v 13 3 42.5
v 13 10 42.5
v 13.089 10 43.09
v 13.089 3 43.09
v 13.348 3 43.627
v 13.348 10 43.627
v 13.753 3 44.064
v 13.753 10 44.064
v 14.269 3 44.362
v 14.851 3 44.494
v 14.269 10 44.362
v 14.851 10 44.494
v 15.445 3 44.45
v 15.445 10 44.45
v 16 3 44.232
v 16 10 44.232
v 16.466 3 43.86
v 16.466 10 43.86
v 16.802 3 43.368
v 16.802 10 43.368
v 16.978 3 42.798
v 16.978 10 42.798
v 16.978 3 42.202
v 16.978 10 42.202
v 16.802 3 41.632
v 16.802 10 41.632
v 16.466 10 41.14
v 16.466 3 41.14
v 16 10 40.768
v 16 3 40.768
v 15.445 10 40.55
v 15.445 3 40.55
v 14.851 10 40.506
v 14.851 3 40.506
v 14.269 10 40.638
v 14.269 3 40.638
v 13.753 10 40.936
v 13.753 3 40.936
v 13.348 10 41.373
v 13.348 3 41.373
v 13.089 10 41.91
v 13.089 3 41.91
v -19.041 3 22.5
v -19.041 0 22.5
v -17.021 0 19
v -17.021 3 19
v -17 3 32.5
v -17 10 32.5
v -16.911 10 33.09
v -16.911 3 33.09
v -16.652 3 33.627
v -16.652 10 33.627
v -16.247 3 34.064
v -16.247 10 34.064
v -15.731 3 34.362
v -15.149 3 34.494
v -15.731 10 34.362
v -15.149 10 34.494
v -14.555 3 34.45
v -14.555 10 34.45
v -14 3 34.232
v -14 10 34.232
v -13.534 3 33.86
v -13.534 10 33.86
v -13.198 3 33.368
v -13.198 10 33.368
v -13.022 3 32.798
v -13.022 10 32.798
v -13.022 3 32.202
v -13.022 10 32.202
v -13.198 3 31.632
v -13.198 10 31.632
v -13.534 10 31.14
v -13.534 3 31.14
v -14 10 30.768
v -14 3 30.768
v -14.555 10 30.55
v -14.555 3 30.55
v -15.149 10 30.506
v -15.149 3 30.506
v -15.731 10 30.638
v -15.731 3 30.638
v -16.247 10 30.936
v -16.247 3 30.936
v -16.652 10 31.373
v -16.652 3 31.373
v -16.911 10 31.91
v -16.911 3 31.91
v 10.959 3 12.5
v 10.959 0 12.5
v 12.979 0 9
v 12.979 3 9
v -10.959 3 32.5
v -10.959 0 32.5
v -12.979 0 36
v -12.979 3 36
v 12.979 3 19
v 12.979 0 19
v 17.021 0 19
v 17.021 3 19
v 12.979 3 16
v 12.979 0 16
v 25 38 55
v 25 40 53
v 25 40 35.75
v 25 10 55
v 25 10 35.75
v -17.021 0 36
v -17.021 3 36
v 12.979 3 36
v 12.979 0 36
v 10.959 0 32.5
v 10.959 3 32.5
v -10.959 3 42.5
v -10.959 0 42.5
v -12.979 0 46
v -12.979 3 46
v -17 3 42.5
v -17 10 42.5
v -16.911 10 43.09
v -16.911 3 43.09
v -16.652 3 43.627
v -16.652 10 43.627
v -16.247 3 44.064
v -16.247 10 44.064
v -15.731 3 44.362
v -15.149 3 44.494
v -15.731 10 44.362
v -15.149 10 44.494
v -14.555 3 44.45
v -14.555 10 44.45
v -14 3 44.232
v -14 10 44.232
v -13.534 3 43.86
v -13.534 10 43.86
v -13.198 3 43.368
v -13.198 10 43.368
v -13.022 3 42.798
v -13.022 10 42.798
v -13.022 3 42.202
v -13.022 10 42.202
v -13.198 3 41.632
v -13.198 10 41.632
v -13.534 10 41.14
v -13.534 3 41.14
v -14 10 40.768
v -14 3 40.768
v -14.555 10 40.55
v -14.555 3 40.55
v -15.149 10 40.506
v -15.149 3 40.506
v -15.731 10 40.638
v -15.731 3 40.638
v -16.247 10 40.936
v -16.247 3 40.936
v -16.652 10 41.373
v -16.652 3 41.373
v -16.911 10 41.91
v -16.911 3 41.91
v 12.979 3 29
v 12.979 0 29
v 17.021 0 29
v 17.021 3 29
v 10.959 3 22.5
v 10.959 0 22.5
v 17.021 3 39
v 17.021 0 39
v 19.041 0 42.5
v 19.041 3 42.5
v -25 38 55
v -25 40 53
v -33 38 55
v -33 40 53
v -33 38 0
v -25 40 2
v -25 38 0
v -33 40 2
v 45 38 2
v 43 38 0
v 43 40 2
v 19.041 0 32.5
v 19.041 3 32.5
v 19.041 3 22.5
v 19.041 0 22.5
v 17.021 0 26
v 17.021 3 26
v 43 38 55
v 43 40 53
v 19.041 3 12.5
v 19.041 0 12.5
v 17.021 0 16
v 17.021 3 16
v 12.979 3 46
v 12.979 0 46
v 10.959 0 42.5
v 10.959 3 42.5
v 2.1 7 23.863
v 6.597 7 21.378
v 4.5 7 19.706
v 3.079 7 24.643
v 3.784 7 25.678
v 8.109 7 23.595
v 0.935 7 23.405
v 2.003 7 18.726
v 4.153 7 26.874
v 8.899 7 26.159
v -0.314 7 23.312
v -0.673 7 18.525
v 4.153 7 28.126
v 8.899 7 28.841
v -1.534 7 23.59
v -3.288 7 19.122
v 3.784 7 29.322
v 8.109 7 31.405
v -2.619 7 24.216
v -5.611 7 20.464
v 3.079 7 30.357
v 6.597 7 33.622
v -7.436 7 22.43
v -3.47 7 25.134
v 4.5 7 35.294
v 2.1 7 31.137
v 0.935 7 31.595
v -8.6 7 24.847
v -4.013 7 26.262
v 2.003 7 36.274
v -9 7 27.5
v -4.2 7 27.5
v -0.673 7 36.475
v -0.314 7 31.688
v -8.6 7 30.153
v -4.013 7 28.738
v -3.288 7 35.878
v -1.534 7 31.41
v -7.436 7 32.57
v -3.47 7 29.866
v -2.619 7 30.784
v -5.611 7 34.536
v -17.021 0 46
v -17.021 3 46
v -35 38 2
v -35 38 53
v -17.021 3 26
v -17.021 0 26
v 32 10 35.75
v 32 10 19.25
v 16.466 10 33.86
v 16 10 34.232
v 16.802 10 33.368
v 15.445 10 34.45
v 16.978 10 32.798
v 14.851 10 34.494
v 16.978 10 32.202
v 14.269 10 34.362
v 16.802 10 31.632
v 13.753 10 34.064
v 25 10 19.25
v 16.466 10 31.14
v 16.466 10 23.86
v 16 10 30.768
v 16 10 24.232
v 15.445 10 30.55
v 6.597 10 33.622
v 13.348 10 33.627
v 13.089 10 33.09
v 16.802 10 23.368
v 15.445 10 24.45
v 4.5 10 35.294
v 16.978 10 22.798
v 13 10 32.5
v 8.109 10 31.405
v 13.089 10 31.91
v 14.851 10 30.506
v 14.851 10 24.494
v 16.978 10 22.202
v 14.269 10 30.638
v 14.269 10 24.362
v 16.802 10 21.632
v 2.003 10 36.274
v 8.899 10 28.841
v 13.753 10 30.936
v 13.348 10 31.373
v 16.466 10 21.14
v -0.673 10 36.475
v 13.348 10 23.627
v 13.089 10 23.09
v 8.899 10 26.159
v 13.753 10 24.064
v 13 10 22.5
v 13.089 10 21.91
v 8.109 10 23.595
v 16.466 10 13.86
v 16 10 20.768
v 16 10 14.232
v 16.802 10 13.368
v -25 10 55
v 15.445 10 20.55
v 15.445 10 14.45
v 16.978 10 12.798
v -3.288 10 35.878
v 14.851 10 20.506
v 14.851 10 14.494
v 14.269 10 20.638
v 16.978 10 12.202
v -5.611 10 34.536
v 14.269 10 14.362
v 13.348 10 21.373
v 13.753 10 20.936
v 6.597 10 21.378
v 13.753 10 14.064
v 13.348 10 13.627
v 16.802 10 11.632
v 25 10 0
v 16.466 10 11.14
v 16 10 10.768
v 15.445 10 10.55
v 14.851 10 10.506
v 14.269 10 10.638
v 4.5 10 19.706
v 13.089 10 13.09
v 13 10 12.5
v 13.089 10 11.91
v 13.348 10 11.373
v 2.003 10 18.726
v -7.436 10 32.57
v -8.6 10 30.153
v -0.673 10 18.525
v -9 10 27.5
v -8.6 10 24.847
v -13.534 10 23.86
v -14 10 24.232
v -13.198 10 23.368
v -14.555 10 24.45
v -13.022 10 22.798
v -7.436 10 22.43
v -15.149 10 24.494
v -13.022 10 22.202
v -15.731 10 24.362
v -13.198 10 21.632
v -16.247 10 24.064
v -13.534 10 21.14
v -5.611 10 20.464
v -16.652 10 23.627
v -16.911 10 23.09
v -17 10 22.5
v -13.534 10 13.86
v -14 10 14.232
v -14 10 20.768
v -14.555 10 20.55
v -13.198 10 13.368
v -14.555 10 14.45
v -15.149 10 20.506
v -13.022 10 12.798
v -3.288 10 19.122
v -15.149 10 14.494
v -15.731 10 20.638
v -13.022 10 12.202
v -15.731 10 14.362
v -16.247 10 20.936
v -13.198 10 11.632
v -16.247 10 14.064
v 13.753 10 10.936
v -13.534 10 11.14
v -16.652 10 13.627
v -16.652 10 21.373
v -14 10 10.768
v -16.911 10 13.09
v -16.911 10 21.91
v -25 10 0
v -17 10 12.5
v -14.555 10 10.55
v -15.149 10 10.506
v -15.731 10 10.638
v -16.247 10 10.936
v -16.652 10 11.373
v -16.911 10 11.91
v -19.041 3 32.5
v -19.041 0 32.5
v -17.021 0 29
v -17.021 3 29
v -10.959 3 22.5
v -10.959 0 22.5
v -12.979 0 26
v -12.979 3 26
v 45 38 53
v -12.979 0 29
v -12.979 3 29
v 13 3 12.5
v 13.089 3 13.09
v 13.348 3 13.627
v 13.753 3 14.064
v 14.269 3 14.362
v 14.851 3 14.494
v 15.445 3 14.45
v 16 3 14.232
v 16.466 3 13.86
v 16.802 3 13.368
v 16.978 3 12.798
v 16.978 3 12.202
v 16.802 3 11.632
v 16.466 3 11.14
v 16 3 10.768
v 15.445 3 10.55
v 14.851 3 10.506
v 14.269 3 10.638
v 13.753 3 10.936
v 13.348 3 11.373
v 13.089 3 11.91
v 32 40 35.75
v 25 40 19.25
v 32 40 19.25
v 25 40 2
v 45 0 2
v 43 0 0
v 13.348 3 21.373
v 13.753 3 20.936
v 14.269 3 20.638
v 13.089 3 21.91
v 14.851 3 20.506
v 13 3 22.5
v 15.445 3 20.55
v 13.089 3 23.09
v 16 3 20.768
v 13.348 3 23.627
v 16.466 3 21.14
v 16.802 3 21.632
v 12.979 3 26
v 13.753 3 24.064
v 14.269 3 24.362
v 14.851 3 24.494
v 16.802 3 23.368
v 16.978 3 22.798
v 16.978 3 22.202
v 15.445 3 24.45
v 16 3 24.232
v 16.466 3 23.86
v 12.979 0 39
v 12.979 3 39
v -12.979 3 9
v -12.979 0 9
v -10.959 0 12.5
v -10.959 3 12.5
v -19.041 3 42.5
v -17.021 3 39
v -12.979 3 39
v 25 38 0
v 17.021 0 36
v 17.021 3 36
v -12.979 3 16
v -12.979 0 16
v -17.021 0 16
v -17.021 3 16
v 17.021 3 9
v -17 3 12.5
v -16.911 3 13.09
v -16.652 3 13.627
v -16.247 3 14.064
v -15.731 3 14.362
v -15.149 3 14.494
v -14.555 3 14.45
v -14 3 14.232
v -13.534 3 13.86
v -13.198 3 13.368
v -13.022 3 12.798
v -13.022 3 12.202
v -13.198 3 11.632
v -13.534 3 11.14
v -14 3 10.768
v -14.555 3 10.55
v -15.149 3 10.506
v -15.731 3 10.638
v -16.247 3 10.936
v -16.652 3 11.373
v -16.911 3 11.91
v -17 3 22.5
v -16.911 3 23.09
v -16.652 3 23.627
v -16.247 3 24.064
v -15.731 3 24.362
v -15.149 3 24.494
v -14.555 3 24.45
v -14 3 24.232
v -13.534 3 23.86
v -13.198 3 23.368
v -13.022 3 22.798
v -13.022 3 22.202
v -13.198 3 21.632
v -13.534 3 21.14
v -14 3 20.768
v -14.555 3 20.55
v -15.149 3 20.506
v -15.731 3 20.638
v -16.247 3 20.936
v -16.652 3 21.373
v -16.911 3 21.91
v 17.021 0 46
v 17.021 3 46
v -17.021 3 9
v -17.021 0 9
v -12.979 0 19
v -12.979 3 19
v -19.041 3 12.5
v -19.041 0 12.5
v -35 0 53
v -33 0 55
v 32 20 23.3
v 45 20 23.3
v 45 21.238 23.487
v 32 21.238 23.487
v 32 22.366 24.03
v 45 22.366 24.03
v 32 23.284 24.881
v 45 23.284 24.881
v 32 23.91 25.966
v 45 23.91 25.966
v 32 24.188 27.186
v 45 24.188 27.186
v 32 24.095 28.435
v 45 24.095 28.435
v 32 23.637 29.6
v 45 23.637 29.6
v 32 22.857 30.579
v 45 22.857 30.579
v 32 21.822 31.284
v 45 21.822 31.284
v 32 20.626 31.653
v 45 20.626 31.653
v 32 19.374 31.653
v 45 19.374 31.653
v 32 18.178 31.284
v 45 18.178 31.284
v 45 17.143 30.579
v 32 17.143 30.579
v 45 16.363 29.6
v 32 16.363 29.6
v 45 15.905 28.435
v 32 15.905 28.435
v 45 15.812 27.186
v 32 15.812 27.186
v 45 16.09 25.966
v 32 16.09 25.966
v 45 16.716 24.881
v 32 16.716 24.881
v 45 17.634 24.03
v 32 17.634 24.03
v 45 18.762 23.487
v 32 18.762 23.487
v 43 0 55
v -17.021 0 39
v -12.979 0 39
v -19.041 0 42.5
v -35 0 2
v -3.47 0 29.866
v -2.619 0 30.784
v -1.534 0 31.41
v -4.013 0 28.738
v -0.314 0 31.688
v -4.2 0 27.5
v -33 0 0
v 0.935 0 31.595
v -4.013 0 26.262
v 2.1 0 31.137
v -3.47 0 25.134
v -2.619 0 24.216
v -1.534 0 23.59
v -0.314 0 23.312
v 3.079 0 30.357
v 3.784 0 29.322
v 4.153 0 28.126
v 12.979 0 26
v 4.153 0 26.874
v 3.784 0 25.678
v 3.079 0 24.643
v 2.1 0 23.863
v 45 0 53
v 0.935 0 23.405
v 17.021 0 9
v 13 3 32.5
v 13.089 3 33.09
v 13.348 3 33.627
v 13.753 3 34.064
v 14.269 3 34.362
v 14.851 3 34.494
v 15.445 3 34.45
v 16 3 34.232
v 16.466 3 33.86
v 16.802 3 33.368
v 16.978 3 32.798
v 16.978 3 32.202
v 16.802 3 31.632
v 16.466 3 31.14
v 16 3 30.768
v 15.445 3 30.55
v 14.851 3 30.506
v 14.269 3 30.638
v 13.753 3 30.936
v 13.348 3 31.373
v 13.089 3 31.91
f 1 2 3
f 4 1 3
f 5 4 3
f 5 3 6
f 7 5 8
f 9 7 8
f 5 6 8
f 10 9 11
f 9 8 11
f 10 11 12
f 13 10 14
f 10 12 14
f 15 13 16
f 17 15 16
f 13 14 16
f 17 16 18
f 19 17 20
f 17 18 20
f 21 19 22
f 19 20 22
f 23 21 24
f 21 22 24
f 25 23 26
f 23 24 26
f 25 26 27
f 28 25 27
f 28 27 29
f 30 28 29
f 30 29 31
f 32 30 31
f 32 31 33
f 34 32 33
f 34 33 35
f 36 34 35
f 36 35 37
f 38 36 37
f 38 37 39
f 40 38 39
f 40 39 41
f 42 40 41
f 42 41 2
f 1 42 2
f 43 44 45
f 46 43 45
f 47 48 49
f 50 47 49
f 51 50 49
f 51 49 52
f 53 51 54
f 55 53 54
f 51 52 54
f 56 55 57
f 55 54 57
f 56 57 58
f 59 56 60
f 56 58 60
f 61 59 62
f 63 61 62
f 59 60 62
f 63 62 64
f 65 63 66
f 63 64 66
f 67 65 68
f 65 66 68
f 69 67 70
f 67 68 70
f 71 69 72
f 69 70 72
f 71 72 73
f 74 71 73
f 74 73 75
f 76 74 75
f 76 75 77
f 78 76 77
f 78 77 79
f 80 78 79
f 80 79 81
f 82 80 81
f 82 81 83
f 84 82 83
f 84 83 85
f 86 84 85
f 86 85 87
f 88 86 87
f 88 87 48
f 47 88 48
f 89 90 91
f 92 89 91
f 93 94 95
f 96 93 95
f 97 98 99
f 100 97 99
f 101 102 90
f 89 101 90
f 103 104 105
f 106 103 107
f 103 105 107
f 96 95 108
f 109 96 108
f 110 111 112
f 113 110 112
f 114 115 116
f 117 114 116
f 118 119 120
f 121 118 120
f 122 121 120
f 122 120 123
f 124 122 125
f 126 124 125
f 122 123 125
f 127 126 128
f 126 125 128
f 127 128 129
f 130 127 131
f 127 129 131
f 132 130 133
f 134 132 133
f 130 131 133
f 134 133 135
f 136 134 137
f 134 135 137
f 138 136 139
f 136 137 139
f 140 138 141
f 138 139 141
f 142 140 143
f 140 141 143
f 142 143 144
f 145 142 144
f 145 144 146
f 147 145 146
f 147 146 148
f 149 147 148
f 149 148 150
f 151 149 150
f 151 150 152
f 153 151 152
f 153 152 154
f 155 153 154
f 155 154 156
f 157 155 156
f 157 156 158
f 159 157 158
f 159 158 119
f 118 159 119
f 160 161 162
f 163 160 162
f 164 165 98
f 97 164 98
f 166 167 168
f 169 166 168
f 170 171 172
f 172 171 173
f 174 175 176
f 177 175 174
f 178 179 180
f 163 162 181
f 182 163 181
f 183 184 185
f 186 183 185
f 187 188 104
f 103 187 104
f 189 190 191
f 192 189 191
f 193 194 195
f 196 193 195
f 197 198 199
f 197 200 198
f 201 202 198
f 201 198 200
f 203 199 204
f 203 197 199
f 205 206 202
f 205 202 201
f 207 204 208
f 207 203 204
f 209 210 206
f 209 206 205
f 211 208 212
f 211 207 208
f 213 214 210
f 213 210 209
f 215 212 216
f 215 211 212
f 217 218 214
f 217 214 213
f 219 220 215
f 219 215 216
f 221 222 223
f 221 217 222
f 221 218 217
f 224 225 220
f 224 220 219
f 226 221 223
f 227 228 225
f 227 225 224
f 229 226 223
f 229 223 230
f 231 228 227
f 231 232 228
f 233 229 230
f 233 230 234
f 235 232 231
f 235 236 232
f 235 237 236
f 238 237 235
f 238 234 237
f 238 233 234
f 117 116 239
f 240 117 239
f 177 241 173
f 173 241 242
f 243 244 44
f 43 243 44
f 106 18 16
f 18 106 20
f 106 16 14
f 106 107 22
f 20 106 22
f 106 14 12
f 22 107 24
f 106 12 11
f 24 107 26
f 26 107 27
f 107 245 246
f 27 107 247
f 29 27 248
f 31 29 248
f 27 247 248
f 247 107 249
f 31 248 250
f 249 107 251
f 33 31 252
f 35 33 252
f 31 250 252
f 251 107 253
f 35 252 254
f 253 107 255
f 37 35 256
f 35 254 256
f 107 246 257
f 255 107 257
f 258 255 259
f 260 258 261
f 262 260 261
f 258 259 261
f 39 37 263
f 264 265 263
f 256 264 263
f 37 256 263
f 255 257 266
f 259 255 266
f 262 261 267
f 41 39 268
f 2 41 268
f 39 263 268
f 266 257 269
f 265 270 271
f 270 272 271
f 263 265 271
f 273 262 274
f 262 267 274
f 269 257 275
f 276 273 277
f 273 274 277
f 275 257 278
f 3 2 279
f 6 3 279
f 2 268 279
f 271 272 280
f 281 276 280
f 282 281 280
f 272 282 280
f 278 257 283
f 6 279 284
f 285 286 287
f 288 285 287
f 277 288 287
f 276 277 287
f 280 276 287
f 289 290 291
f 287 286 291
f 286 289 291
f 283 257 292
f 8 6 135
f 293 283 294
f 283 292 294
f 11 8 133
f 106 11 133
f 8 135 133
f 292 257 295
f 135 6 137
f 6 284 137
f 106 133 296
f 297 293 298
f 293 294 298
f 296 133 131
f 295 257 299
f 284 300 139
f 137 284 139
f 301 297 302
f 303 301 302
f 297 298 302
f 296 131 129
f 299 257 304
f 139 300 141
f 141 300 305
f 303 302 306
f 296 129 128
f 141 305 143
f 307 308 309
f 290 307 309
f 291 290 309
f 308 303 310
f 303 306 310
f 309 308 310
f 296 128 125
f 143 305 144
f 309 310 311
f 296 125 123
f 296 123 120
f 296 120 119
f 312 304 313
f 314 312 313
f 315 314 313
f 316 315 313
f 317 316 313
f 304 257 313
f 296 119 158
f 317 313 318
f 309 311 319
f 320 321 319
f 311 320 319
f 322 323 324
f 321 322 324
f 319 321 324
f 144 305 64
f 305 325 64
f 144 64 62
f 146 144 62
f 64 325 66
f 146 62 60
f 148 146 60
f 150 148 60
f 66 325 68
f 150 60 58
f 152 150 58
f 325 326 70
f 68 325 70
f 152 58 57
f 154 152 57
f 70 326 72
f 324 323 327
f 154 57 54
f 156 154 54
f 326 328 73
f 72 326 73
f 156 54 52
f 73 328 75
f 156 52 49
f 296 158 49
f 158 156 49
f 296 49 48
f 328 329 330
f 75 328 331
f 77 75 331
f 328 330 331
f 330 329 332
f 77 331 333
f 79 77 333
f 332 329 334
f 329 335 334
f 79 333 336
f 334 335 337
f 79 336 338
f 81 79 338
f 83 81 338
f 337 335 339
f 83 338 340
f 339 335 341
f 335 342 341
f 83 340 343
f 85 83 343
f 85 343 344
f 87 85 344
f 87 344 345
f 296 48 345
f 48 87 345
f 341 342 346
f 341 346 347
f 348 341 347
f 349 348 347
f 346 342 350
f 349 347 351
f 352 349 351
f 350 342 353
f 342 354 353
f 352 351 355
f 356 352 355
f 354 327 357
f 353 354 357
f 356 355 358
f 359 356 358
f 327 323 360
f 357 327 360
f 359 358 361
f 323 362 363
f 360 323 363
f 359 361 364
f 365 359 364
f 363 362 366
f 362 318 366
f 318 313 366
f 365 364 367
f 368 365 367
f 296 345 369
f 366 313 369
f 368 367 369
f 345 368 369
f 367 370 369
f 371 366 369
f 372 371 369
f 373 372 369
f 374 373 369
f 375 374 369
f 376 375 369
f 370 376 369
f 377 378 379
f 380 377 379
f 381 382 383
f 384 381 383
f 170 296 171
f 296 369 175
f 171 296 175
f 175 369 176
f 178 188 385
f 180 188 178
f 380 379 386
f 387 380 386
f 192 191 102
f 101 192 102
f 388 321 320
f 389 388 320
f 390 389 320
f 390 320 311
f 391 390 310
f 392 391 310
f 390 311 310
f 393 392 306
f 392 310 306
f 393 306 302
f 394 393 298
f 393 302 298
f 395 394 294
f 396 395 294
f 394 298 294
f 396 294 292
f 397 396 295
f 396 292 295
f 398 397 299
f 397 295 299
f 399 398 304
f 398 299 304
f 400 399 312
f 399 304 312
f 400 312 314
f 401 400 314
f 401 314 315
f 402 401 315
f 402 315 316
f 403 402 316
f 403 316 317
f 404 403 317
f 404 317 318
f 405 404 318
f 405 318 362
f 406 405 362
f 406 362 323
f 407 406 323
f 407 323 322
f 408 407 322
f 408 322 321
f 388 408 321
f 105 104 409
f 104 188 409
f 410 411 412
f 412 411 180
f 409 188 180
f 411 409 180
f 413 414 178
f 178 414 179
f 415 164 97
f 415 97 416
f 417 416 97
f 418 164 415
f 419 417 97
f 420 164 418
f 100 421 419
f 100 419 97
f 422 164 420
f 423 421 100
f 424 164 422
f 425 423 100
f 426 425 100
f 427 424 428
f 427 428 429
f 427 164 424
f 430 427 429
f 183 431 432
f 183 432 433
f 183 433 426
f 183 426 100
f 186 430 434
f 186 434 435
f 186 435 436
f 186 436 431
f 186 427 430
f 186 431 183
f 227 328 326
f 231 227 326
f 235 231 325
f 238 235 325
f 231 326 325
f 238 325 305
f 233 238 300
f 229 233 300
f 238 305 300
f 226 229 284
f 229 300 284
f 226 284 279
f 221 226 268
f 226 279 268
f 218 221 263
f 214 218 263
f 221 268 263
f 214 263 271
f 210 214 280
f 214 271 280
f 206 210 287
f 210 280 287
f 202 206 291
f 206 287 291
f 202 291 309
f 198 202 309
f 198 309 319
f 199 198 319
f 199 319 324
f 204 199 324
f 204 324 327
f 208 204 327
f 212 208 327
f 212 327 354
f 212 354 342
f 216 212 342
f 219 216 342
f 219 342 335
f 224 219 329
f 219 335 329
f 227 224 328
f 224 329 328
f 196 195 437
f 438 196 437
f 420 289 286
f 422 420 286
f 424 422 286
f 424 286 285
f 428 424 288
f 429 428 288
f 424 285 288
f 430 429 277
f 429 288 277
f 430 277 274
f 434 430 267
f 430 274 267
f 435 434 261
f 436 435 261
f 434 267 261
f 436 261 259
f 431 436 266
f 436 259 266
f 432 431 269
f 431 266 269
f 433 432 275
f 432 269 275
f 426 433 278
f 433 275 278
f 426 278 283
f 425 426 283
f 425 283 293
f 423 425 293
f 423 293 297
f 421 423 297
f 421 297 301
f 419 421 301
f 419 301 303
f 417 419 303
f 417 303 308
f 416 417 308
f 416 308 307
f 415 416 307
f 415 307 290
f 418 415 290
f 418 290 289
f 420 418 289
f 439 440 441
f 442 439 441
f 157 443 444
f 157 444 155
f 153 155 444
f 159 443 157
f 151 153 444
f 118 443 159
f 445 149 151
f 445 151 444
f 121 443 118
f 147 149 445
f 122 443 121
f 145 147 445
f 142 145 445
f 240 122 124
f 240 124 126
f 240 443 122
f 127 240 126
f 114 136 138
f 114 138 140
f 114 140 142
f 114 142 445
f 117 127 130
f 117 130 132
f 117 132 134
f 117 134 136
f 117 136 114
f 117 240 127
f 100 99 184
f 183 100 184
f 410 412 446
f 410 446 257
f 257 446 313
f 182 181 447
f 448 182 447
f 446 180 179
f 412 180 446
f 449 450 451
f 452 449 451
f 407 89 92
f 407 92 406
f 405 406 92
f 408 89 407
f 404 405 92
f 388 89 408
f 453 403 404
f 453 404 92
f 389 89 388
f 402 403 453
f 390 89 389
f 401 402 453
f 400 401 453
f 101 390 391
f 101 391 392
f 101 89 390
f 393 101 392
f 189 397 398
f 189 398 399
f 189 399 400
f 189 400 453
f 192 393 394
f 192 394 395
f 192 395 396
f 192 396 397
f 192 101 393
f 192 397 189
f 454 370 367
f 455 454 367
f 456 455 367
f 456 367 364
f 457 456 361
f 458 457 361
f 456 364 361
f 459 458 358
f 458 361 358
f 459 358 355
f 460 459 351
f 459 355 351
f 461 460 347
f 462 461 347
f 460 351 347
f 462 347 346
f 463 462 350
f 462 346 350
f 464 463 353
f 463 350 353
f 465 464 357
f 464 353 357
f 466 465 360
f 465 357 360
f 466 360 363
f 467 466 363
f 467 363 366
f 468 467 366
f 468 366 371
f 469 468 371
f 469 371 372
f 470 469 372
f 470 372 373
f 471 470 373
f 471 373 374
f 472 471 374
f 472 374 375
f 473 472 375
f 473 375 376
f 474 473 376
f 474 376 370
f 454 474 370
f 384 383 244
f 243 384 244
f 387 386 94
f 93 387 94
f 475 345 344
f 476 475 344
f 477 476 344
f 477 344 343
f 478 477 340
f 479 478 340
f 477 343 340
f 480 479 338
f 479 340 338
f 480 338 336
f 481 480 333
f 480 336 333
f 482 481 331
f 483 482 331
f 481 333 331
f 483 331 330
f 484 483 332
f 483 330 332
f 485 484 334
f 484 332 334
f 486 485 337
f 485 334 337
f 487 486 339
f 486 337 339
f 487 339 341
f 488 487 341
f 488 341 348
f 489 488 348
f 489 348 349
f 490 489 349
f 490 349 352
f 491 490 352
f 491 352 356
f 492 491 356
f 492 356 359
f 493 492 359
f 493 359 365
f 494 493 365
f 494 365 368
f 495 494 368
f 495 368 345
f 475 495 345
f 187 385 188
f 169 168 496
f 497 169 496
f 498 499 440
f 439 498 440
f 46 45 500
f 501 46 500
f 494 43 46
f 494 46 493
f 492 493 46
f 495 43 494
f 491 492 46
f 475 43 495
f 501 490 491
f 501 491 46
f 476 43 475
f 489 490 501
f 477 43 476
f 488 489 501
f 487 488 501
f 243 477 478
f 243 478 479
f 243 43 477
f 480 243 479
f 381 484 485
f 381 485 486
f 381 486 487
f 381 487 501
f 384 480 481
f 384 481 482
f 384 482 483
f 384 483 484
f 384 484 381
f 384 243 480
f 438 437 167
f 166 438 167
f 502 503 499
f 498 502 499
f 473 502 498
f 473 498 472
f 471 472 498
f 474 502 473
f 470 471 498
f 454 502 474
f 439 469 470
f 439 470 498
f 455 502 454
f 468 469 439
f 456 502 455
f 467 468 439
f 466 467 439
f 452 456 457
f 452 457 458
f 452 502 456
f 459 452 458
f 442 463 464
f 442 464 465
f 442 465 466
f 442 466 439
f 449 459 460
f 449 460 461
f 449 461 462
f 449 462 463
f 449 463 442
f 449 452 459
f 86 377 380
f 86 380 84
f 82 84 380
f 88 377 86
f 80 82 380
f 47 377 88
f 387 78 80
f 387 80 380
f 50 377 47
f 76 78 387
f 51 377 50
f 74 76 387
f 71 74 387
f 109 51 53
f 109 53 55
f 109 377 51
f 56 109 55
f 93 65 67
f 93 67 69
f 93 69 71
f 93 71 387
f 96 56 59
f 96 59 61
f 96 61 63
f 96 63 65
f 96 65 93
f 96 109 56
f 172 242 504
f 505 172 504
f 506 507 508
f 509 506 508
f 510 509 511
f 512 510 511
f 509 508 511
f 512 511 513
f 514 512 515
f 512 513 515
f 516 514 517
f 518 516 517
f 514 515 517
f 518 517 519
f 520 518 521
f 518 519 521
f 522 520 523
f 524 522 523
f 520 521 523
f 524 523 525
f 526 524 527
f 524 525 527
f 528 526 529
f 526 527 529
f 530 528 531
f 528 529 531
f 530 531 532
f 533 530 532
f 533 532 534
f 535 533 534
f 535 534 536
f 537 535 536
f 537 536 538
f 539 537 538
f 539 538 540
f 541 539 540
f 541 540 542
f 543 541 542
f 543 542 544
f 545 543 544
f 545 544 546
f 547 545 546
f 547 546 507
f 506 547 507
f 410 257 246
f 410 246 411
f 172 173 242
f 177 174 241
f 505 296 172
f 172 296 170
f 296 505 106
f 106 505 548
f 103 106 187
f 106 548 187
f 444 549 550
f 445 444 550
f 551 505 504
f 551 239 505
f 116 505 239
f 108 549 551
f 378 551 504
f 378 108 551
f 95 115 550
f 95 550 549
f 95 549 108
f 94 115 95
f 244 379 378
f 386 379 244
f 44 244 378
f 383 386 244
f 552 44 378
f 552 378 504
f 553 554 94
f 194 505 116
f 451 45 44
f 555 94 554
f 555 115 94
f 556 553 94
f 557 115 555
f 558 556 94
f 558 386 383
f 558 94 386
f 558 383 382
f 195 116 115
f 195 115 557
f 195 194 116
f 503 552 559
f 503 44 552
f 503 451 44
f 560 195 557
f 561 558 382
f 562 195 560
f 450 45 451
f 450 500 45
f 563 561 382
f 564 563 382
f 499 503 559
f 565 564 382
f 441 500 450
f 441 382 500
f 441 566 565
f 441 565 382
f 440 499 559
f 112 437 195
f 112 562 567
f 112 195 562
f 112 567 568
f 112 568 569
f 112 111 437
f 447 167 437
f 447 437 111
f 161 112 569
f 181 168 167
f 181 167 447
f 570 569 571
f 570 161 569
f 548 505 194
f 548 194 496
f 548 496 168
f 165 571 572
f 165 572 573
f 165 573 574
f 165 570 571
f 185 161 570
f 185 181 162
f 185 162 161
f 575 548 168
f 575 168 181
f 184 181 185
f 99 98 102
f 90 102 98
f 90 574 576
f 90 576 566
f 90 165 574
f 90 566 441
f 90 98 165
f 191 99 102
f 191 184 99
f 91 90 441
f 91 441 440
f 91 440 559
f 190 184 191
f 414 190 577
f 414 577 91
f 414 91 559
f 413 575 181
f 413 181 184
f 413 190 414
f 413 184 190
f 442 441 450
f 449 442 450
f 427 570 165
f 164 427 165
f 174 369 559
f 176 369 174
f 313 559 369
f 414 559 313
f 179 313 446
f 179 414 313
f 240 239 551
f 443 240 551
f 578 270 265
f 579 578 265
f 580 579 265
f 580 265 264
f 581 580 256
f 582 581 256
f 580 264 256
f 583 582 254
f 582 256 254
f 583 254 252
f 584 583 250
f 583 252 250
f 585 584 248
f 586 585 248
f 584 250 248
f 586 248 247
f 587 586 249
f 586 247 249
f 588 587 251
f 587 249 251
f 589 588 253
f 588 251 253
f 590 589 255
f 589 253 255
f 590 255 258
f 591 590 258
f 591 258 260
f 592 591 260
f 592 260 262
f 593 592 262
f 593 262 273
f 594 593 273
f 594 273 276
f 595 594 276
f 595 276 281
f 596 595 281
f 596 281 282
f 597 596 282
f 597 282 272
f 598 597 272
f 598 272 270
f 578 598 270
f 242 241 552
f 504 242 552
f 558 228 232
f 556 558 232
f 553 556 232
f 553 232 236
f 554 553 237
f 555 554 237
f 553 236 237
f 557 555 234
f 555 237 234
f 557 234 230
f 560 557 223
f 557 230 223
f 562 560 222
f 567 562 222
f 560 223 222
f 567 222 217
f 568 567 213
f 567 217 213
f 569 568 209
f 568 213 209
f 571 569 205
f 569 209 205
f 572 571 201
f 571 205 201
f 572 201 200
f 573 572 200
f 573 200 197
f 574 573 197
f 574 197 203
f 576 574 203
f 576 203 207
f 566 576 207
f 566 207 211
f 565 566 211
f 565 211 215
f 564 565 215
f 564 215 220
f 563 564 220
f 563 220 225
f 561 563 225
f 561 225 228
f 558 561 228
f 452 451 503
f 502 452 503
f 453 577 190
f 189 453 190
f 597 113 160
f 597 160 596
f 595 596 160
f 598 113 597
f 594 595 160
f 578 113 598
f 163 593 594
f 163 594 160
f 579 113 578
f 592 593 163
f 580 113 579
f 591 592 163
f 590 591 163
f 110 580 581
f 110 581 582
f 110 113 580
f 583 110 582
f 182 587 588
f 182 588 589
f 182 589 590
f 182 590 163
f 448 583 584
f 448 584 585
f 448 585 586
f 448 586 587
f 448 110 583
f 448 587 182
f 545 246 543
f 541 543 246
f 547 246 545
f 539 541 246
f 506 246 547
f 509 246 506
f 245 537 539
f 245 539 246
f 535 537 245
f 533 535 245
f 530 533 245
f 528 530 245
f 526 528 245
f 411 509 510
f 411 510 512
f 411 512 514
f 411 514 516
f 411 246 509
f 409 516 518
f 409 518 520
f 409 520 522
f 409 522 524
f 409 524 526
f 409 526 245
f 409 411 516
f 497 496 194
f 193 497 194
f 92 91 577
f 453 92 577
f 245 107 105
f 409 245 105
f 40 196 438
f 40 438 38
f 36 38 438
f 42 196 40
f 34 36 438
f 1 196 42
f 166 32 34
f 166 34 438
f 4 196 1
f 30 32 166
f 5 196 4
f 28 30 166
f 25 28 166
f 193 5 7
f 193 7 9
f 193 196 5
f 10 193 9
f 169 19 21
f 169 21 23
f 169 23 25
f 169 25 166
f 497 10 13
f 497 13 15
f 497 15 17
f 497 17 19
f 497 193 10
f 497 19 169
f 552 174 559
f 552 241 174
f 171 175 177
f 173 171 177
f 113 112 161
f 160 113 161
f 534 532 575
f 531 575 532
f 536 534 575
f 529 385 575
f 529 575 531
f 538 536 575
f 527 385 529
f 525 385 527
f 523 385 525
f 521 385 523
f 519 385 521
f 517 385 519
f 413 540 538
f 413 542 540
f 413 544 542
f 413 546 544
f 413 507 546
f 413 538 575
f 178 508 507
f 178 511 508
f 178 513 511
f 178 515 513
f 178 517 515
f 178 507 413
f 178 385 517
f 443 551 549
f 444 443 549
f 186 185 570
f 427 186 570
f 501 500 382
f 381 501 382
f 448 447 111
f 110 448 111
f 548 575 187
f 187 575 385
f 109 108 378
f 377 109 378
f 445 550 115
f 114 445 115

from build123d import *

# Parameters (mm, degrees)
BOSS_EXTRUDE1_DEPTH = 55
SKETCH2_R           = 2
CUT_EXTRUDE1_DEPTH  = 72.763500472
CUT_EXTRUDE2_DEPTH  = 3
SKETCH4_R           = 4.2
CUT_EXTRUDE3_DEPTH  = 72.763500472
SKETCH5_R           = 9
CUT_EXTRUDE4_DEPTH  = 3
SKETCH6_R           = 4.2
CUT_EXTRUDE5_DEPTH  = 10
SKETCH7_W           = 16.5
SKETCH7_H           = 30
CUT_EXTRUDE6_DEPTH  = 7
BOSS_EXTRUDE2_START = 10
SKETCH8_W           = 55
SKETCH8_H           = 40
SKETCH8_R           = 4.2
BOSS_EXTRUDE2_DEPTH = 10
CHAMFER1_SIZE       = 2


with BuildPart() as part:
    # Sketch1 → Boss-Extrude1 (new body)
    with BuildSketch(Plane.XY):
        Polygon((0, 0), (35, 0), (35, 40), (25, 40), (25, 10), (0, 10), (-25, 10), (-25, 40), (-35, 40), (-35, 0), align=None)
    extrude(amount=BOSS_EXTRUDE1_DEPTH)

    # Sketch2 → Cut-Extrude1 (cut, through all)
    with BuildSketch(Plane(origin=(0, 10, 0), x_dir=(1, 0, 0), z_dir=(0, 1, 0))):
        with Locations(Location((-15, -12.5, 0), (0, 0, 180))):
            Circle(SKETCH2_R)
        with Locations(Location((-15, -22.5, 0), (0, 0, 180))):
            Circle(SKETCH2_R)
        with Locations(Location((15, -12.5, 0), (0, 0, 180))):
            Circle(SKETCH2_R)
        with Locations(Location((15, -22.5, 0), (0, 0, 180))):
            Circle(SKETCH2_R)
        with Locations(Location((15, -32.5, 0), (0, 0, 180))):
            Circle(SKETCH2_R)
        with Locations(Location((-15, -32.5, 0), (0, 0, 180))):
            Circle(SKETCH2_R)
        with Locations(Location((-15, -42.5, 0), (0, 0, 180))):
            Circle(SKETCH2_R)
        with Locations(Location((15, -42.5, 0), (0, 0, 180))):
            Circle(SKETCH2_R)
    extrude(amount=-CUT_EXTRUDE1_DEPTH, mode=Mode.SUBTRACT)

    # Sketch3 → Cut-Extrude2 (cut)
    with BuildSketch(Plane.XZ):
        Polygon((-10.958548116, 12.5), (-12.979274058, 16), (-17.020725942, 16), (-19.041451884, 12.5), (-17.020725942, 9), (-12.979274058, 9), align=None)
        Polygon((-10.958548116, 22.5), (-12.979274058, 26), (-17.020725942, 26), (-19.041451884, 22.5), (-17.020725942, 19), (-12.979274058, 19), align=None)
        Polygon((-10.958548116, 32.5), (-12.979274058, 36), (-17.020725942, 36), (-19.041451884, 32.5), (-17.020725942, 29), (-12.979274058, 29), align=None)
        Polygon((-10.958548116, 42.5), (-12.979274058, 46), (-17.020725942, 46), (-19.041451884, 42.5), (-17.020725942, 39), (-12.979274058, 39), align=None)
        Polygon((19.041451884, 42.5), (17.020725942, 46), (12.979274058, 46), (10.958548116, 42.5), (12.979274058, 39), (17.020725942, 39), align=None)
        Polygon((19.041451884, 32.5), (17.020725942, 36), (12.979274058, 36), (10.958548116, 32.5), (12.979274058, 29), (17.020725942, 29), align=None)
        Polygon((19.041451884, 22.5), (17.020725942, 26), (12.979274058, 26), (10.958548116, 22.5), (12.979274058, 19), (17.020725942, 19), align=None)
        Polygon((19.041451884, 12.5), (17.020725942, 16), (12.979274058, 16), (10.958548116, 12.5), (12.979274058, 9), (17.020725942, 9), align=None)
    extrude(amount=-CUT_EXTRUDE2_DEPTH, mode=Mode.SUBTRACT)

    # Sketch4 → Cut-Extrude3 (cut, through all)
    with BuildSketch(Plane(origin=(0, 10, 0), x_dir=(1, 0, 0), z_dir=(0, 1, 0))):
        with Locations(Location((0, -27.5, 0), (0, 0, 180))):
            Circle(SKETCH4_R)
    extrude(amount=-CUT_EXTRUDE3_DEPTH, mode=Mode.SUBTRACT)

    # Sketch5 → Cut-Extrude4 (cut)
    with BuildSketch(Plane(origin=(0, 10, 0), x_dir=(1, 0, 0), z_dir=(0, 1, 0))):
        with Locations(Location((0, -27.5, 0), (0, 0, 180))):
            Circle(SKETCH5_R)
    extrude(amount=-CUT_EXTRUDE4_DEPTH, mode=Mode.SUBTRACT)

    # Sketch6 → Cut-Extrude5 (cut)
    with BuildSketch(Plane(origin=(35, 0, 0), x_dir=(0, 0, -1), z_dir=(1, 0, 0))):
        with Locations((-27.5, 20)):
            Circle(SKETCH6_R)
    extrude(amount=-CUT_EXTRUDE5_DEPTH, mode=Mode.SUBTRACT)

    # Sketch7 → Cut-Extrude6 (cut)
    with BuildSketch(Plane.ZY.offset(-25)):
        with Locations((27.5, 25)):
            Rectangle(SKETCH7_W, SKETCH7_H)
    extrude(amount=-CUT_EXTRUDE6_DEPTH, mode=Mode.SUBTRACT)

    # Sketch8 → Boss-Extrude2 (add)
    with BuildSketch(Plane(origin=(35, 0, 0), x_dir=(0, 0, -1), z_dir=(1, 0, 0)).offset(BOSS_EXTRUDE2_START)):
        with Locations((-27.5, 20)):
            Rectangle(SKETCH8_W, SKETCH8_H)
        with Locations((-27.5, 20)):
            Circle(SKETCH8_R, mode=Mode.SUBTRACT)
    extrude(amount=-BOSS_EXTRUDE2_DEPTH)

    # Chamfer1
    chamfer1_edges = [part.edges().sort_by_distance(p)[0] for p in [
        (-35, 20, 0),
        (-30, 40, 0),
        (35, 40, 0),
        (-35, 40, 27.5),
        (45, 20, 0),
        (45, 40, 27.5),
        (45, 20, 55),
        (-30, 40, 55),
        (-35, 20, 55),
        (35, 40, 55),
    ]]
    chamfer(chamfer1_edges, length=CHAMFER1_SIZE)


solid = part.part
